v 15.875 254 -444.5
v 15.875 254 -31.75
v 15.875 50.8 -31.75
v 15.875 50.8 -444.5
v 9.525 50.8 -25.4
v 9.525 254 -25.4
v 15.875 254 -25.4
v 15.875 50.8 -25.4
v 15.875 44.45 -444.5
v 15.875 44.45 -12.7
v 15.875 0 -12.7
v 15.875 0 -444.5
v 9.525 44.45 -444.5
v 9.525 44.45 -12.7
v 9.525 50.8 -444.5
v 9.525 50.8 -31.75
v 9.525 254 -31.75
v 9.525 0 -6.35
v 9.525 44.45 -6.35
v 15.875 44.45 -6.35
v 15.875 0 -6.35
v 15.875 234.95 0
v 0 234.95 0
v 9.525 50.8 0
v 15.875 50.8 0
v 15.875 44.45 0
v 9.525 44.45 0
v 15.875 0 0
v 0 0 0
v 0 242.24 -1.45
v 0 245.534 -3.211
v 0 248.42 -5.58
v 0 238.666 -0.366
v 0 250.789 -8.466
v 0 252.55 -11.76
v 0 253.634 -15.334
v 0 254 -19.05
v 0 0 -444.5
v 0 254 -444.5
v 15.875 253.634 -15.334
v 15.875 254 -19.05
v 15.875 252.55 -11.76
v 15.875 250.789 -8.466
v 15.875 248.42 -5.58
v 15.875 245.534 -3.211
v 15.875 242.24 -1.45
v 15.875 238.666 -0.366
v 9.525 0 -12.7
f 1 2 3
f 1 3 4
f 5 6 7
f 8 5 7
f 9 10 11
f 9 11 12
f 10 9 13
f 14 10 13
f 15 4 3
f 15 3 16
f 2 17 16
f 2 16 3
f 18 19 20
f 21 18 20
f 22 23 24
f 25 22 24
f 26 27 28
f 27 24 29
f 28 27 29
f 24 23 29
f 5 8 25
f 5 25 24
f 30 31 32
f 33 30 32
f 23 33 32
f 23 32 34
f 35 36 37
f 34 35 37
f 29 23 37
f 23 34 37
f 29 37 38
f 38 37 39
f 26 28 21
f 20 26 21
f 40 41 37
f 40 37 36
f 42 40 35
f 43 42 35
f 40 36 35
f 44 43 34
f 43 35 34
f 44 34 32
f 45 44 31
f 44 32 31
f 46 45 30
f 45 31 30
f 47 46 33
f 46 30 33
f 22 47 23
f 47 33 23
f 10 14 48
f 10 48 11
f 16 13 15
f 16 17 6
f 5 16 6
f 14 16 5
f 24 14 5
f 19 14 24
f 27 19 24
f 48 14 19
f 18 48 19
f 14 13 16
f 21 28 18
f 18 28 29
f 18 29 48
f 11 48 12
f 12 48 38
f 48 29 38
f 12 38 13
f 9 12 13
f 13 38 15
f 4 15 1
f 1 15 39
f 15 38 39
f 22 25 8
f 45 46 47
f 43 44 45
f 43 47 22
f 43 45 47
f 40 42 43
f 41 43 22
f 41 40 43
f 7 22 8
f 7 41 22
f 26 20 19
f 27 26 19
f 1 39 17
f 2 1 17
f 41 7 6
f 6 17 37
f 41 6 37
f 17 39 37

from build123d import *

# Parameters (mm, degrees)
BOSS_EXTRUDE1_DEPTH = 15.875
SKETCH2_W           = 6.35
SKETCH2_H           = 6.35
CUT_EXTRUDE1_DEPTH  = 445.5
CUT_EXTRUDE3_REACH  = 256
SKETCH3_W           = 6.35
SKETCH3_H           = 6.35
CUT_EXTRUDE4_REACH  = 256
SKETCH4_W           = 6.35
SKETCH4_H           = 6.35


with BuildPart() as part:
    # Sketch1 → Boss-Extrude1 (new body)
    with BuildSketch(Plane(origin=(0, 0, 0), x_dir=(0, 0, -1), z_dir=(1, 0, 0))):
        with BuildLine():
            Line((0, 0), (444.5, 0))
            Line((444.5, 0), (444.5, 254))
            Line((444.5, 254), (19.05, 254))
            ThreePointArc((19.05, 254), (5.579615818, 248.420384182), (0, 234.95))
            Line((0, 234.95), (0, 0))
        make_face()
    extrude(amount=BOSS_EXTRUDE1_DEPTH)

    # Sketch2 → Cut-Extrude1 (cut, through all)
    with BuildSketch(Plane(origin=(0, 0, -444.5), x_dir=(-1, 0, 0), z_dir=(0, 0, -1))):
        with Locations((-12.7, 47.625)):
            Rectangle(SKETCH2_W, SKETCH2_H)
    extrude(amount=-CUT_EXTRUDE1_DEPTH, mode=Mode.SUBTRACT)

    # Sketch3 → Cut-Extrude3 (cut, up to next)
    with BuildSketch(Plane.XZ, mode=Mode.PRIVATE) as cut_extrude3_sk1:
        with Locations((12.7, -9.525)):
            Rectangle(SKETCH3_W, SKETCH3_H)
    cut_extrude3_tool1 = extrude(cut_extrude3_sk1.sketch, amount=-CUT_EXTRUDE3_REACH, mode=Mode.PRIVATE) & part.part
    add(cut_extrude3_tool1.solids().sort_by_distance((12.7, 0, -9.525))[0], mode=Mode.SUBTRACT)

    # Sketch4 → Cut-Extrude4 (cut, up to next)
    with BuildSketch(Plane(origin=(0, 254, 0), x_dir=(1, 0, 0), z_dir=(0, 1, 0)), mode=Mode.PRIVATE) as cut_extrude4_sk1:
        with Locations((12.7, 28.575)):
            Rectangle(SKETCH4_W, SKETCH4_H)
    cut_extrude4_tool1 = extrude(cut_extrude4_sk1.sketch, amount=-CUT_EXTRUDE4_REACH, mode=Mode.PRIVATE) & part.part
    add(cut_extrude4_tool1.solids().sort_by_distance((12.7, 254, -28.575))[0], mode=Mode.SUBTRACT)


solid = part.part
